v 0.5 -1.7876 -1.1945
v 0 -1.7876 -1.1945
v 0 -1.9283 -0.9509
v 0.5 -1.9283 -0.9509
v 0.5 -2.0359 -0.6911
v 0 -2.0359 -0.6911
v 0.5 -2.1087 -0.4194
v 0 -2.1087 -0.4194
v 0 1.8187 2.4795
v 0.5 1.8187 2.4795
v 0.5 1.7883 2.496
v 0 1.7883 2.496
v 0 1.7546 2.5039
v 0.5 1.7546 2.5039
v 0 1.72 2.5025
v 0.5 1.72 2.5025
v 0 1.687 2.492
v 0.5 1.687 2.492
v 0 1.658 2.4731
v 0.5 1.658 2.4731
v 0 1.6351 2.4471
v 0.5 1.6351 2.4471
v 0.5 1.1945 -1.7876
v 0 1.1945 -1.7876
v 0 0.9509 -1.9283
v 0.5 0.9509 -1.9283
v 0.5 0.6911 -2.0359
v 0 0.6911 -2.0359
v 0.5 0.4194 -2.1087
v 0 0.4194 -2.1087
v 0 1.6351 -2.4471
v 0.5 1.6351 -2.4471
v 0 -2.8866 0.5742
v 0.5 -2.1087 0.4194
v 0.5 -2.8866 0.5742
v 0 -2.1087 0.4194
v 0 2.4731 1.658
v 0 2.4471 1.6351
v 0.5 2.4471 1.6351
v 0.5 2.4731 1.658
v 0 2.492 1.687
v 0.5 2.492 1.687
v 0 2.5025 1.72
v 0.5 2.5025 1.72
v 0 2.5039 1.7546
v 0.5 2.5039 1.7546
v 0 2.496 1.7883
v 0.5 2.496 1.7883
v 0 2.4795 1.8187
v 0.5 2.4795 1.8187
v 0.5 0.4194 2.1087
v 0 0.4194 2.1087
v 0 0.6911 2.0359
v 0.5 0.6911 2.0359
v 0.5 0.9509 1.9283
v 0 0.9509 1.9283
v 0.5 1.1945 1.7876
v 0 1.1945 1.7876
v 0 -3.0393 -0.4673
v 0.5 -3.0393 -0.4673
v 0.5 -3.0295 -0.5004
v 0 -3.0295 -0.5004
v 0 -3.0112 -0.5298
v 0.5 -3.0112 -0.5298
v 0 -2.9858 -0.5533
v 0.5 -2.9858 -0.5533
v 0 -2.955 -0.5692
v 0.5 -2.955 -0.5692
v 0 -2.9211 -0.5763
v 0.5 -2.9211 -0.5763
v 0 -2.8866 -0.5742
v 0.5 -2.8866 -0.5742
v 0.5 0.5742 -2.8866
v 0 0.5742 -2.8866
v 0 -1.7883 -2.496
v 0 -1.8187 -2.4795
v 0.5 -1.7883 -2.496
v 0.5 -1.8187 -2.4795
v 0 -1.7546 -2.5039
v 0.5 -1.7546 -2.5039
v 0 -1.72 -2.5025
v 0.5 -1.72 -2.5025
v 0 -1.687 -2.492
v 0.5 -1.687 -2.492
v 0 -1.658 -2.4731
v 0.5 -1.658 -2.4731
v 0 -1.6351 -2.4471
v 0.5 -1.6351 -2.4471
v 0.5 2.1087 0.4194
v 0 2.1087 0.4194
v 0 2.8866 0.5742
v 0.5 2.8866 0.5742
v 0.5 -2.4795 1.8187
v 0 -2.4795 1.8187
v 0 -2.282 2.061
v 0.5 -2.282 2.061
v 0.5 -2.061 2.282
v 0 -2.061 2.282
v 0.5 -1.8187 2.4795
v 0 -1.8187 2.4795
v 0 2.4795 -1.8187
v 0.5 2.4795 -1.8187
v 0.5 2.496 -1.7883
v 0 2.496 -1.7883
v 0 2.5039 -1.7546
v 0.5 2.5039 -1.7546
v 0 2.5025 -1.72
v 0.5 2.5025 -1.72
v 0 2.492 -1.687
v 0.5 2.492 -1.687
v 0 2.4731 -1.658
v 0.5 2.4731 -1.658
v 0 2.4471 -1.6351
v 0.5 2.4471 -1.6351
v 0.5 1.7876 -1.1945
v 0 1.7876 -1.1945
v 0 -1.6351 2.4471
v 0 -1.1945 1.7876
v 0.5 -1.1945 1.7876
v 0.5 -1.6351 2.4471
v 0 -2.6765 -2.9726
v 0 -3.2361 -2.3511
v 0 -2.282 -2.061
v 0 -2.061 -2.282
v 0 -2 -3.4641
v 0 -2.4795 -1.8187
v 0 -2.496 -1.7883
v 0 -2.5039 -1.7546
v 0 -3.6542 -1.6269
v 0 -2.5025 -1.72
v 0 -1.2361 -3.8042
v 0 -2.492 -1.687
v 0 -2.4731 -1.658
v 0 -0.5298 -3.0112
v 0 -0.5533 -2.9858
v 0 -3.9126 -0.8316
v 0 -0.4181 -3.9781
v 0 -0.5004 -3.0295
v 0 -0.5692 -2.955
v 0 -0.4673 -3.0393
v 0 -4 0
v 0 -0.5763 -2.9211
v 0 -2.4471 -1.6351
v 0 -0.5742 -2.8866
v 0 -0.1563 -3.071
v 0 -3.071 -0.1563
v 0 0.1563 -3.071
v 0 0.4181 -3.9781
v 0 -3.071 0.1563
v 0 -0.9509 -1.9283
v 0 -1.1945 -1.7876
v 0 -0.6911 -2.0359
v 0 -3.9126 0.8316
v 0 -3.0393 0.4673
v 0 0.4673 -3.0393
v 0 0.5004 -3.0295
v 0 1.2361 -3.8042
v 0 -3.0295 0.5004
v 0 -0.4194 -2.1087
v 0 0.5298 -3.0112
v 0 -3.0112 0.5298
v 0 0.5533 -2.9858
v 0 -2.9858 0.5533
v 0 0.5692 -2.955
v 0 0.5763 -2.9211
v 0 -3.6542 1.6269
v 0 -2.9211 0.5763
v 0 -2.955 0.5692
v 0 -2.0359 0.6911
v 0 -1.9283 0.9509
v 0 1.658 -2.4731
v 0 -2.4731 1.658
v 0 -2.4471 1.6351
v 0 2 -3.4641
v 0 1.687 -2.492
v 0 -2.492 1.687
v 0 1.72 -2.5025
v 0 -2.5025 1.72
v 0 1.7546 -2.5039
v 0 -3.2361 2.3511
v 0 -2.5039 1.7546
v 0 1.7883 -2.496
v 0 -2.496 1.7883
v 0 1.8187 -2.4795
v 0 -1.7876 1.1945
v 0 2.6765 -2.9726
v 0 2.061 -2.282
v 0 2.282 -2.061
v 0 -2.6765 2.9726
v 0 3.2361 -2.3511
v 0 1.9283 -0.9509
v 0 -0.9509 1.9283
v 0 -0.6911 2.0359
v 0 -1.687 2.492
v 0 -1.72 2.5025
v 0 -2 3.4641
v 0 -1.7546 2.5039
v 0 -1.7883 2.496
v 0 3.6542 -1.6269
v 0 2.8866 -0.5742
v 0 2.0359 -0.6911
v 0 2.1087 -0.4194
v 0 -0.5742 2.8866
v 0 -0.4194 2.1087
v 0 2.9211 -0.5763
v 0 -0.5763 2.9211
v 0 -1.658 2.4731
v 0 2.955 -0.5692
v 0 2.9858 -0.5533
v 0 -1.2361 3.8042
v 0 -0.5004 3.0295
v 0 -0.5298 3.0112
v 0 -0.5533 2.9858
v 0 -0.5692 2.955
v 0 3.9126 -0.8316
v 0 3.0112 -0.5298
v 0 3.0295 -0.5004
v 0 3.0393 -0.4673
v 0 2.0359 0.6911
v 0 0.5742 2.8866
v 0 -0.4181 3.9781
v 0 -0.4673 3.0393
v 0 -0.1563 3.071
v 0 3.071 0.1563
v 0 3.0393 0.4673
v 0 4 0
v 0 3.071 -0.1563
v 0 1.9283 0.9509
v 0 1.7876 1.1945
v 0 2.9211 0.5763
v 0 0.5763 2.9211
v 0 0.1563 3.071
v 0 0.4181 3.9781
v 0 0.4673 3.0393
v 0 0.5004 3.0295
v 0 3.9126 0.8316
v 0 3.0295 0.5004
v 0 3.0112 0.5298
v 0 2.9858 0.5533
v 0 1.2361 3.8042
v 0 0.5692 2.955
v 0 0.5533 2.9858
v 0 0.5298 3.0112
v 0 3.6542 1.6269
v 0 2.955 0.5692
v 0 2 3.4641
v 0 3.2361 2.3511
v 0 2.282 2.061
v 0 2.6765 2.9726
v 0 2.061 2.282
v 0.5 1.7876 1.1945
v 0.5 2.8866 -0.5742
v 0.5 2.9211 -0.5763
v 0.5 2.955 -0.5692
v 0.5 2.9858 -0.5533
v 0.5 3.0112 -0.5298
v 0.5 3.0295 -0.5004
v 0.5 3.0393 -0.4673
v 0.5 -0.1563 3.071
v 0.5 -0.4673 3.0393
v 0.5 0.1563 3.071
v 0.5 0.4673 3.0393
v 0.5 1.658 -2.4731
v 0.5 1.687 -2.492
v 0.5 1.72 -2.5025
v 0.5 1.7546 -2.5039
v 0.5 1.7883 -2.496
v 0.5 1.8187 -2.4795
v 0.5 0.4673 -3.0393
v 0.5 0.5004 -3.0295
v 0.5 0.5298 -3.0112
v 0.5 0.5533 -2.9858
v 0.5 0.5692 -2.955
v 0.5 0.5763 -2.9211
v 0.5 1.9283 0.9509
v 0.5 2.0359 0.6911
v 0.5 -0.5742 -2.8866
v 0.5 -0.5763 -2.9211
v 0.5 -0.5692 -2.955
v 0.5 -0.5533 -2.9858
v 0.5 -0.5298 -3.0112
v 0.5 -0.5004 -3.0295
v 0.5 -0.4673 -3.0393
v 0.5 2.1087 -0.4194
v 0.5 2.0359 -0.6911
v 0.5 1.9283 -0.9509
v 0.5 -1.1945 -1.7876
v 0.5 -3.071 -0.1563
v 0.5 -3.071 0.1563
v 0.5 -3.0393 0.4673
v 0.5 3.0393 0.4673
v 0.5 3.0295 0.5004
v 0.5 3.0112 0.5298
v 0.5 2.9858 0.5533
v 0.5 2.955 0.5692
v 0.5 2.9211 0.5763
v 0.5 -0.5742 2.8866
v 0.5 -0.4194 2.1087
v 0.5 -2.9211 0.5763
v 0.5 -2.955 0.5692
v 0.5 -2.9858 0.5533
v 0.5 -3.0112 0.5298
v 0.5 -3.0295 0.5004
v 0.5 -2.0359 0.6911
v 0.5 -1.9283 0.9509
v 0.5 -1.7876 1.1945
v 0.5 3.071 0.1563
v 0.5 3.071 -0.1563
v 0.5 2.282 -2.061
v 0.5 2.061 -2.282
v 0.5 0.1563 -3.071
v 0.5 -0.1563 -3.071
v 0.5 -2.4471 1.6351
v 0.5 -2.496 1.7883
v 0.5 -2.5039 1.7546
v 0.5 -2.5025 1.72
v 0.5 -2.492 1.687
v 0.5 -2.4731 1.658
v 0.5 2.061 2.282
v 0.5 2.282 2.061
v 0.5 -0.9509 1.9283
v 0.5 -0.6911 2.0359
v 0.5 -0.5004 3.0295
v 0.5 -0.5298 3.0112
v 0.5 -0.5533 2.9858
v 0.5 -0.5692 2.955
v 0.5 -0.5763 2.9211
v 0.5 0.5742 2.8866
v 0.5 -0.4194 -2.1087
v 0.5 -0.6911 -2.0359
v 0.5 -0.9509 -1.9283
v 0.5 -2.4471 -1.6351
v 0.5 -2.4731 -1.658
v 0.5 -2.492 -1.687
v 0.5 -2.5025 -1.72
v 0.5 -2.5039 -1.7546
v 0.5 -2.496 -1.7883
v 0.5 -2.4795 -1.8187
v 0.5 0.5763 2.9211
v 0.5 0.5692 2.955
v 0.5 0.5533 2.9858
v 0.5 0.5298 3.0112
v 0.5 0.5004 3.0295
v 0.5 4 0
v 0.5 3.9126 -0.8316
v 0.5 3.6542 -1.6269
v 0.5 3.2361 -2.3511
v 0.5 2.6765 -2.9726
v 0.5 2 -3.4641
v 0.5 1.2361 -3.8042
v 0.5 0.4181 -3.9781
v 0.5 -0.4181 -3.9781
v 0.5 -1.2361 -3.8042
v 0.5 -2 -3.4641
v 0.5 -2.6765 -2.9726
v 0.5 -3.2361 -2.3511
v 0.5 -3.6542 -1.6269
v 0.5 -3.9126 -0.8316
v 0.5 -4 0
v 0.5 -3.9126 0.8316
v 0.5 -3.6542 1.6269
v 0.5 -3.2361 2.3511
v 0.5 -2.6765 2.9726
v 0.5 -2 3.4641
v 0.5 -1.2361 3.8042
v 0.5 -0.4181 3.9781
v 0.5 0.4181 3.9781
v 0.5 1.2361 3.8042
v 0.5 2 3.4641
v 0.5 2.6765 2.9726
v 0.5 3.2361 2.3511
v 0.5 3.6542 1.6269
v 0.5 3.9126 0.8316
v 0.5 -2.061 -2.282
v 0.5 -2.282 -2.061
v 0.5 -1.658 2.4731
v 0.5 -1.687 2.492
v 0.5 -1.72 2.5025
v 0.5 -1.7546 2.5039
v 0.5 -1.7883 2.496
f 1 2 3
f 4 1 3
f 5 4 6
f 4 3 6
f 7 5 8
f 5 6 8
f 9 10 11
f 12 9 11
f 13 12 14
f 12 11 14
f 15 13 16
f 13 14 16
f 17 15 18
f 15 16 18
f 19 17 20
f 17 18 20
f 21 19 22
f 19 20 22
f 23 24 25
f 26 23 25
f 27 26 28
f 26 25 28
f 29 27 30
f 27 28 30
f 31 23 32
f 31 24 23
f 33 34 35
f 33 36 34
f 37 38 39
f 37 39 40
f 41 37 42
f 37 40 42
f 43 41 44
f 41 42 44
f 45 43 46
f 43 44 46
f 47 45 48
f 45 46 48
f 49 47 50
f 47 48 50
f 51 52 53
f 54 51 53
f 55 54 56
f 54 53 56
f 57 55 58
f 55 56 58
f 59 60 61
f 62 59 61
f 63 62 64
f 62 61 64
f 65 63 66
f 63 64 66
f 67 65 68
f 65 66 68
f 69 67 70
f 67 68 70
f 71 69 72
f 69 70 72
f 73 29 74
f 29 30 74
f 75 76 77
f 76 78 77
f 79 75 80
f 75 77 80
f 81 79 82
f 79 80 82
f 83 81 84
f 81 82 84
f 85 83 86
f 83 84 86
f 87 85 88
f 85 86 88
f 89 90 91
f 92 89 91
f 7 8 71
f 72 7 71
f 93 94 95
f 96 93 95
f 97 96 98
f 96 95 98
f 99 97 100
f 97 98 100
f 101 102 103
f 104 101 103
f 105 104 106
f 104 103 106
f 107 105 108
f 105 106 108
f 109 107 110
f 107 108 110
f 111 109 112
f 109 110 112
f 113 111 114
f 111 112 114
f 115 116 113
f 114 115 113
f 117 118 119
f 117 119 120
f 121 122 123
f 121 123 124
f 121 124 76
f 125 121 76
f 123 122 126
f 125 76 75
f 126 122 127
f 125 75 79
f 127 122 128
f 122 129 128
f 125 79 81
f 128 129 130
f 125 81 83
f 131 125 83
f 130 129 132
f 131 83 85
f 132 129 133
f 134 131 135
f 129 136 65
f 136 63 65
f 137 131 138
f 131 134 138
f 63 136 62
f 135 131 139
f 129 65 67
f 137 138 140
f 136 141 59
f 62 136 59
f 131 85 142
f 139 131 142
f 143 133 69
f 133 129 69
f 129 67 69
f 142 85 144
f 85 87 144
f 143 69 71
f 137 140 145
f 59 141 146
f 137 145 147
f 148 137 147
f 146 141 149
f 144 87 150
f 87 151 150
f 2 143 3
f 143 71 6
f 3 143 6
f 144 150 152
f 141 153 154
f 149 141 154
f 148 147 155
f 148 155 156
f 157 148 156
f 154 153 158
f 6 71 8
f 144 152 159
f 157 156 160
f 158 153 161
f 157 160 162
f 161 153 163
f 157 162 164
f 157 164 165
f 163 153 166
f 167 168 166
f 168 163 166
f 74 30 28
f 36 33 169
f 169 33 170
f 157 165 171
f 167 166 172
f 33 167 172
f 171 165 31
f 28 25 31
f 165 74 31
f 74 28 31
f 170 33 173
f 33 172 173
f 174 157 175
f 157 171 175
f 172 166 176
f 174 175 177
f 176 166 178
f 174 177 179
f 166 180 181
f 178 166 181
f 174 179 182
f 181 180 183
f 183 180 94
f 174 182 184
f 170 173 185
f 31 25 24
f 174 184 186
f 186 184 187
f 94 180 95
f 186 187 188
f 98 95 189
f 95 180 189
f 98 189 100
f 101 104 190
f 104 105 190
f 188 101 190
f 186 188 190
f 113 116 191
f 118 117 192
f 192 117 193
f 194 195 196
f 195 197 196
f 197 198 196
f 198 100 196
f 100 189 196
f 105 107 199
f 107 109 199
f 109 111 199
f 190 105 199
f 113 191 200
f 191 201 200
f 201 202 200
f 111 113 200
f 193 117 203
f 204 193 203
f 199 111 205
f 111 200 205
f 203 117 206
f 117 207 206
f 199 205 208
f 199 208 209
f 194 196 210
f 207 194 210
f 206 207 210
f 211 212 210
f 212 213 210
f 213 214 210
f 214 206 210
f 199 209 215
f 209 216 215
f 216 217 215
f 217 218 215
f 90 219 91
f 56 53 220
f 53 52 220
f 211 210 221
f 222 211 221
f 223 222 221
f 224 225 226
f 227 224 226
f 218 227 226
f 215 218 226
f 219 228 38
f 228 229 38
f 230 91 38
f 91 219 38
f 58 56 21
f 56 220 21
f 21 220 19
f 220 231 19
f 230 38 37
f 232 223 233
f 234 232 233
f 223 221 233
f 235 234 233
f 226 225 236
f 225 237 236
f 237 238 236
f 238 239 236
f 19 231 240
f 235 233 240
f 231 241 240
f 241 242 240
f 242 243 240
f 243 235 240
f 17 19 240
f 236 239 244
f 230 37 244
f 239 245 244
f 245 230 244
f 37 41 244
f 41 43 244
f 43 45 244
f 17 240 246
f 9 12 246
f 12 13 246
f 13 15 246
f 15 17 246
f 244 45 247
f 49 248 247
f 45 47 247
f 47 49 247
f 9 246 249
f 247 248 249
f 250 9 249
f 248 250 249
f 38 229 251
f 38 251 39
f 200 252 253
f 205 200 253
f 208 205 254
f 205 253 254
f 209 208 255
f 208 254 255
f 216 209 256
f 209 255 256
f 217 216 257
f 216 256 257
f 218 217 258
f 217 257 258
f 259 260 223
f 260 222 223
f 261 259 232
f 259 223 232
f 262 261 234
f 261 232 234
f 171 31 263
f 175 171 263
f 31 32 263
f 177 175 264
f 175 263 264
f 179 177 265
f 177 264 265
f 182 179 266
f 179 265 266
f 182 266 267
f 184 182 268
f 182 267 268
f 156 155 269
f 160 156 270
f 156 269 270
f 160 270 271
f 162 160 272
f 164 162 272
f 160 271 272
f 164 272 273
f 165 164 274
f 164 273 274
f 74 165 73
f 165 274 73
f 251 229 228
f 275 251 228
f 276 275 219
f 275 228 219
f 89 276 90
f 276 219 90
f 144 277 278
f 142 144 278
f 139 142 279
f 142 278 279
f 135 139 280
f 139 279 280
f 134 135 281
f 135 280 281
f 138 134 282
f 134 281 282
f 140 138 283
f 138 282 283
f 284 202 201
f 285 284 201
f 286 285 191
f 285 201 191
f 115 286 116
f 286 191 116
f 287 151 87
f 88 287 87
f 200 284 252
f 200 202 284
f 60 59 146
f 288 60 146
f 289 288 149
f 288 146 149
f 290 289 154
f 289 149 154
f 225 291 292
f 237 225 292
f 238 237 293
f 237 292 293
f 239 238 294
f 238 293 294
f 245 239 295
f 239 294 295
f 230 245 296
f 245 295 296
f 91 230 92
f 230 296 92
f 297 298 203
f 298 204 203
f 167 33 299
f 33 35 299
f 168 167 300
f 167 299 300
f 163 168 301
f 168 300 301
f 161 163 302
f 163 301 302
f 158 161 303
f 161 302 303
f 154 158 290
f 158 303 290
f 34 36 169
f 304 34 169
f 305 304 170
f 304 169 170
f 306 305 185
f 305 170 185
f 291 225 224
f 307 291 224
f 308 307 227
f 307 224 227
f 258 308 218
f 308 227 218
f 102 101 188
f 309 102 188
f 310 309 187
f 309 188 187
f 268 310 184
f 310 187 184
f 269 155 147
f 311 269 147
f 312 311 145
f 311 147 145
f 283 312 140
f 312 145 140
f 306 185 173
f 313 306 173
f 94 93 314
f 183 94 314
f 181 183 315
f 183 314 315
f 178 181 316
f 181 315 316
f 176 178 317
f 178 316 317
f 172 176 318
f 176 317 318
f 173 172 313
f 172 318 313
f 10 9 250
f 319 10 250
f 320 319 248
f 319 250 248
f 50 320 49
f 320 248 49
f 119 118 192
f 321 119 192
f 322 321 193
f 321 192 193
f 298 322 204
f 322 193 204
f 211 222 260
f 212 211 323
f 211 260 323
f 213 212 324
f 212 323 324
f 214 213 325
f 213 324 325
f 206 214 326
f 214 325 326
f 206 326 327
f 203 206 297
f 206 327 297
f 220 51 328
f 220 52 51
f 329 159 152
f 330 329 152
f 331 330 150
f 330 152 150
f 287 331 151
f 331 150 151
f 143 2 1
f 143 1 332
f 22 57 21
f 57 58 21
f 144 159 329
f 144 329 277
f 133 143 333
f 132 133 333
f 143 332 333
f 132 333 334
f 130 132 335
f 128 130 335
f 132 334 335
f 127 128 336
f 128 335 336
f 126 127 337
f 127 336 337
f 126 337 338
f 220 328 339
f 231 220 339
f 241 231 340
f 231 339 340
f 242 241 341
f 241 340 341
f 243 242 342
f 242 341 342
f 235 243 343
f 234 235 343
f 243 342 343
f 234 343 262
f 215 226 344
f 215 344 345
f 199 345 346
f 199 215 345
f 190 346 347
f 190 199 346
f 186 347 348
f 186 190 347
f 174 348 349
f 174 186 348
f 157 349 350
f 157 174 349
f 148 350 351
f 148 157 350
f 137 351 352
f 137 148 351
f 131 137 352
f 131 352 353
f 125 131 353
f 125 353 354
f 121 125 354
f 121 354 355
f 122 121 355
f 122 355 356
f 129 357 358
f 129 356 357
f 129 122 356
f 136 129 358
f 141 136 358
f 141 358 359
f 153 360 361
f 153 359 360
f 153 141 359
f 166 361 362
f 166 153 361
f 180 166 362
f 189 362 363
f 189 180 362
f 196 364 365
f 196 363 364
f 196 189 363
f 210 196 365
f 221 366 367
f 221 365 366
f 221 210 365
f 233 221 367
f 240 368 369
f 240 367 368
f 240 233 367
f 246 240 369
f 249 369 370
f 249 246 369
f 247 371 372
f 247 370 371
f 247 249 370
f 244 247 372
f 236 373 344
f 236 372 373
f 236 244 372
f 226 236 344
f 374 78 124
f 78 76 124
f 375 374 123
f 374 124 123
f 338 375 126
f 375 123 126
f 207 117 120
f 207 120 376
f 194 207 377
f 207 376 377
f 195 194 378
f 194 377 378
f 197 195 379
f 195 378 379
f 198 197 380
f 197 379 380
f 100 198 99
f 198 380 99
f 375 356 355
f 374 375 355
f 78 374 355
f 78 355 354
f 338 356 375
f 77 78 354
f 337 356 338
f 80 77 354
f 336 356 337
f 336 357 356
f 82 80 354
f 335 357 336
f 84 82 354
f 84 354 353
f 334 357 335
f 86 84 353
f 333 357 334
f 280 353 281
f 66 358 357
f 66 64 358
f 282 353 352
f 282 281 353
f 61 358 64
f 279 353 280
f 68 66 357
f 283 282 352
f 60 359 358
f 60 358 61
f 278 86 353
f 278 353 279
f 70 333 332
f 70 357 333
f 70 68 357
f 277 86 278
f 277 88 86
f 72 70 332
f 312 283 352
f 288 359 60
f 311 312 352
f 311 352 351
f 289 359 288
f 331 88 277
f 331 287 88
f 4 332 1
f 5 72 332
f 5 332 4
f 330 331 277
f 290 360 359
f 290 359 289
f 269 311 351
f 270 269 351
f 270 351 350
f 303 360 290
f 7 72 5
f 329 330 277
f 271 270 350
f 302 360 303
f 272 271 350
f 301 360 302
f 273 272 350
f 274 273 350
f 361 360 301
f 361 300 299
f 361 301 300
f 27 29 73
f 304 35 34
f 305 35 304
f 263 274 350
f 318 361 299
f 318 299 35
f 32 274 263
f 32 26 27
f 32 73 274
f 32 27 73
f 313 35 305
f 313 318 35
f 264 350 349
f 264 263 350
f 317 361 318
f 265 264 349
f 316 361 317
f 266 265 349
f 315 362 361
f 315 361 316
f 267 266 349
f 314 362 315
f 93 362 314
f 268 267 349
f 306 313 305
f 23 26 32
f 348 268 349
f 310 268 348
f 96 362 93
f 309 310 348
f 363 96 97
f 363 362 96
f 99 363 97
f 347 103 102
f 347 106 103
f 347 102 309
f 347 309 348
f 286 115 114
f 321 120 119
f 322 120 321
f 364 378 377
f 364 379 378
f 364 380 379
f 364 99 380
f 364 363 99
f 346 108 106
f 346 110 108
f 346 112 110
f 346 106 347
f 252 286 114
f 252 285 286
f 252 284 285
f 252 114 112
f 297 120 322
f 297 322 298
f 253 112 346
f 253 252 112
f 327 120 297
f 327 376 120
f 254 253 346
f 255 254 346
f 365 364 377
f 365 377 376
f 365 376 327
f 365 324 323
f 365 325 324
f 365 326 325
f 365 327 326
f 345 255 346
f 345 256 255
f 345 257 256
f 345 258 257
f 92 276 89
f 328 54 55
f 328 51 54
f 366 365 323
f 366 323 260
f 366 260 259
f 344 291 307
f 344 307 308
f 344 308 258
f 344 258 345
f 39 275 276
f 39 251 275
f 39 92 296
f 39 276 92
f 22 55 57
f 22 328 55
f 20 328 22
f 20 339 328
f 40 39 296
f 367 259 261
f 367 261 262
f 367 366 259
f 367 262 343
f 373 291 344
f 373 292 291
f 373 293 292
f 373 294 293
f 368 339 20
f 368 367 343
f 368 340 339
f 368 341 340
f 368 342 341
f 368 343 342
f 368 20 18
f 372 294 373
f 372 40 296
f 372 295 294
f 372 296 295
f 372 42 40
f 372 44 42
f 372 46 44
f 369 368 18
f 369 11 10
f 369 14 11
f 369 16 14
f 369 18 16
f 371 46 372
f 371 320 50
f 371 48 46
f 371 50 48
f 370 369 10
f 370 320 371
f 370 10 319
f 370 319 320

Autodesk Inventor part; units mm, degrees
ref_plane "YZ Plane" through (0, 0, 0) normal (1, 0, 0) x (0, 1, 0)
ref_plane "XZ Plane" through (0, 0, 0) normal (0, 1, 0) x (-1, 0, 0)
sketch "Sketch1" plane through (0, 0, 0) normal (1, 0, 0) x (0, 1, 0)
  circle A0 centre (0, 0) radius 4
  circle A1 centre (0, 0) radius 2.15
  dimension "d0" = 8
  dimension "d1" = 4.3
extrude "Body" add sketch "Sketch1" along normal blind 0.5
sketch "Sketch2" plane through (0, 0, 0) normal (-1, 0, 0) x (0, 0, 1)
  circle A0 centre (0, 0) radius 2.15 projected
  circle A1 centre (0, 0) radius 4 projected
  arc A2 (0.5999, 3.0159) -> (-0.5999, 3.0159) centre (0, 0) ccw
  line L0 (-0.4194, 2.1087) -> (-0.5999, 3.0159)
  line L1 (0, 0) -> (0, 3.075) construction
  line L2 (0.4194, 2.1087) -> (0.5999, 3.0159)
  line L3 (-0.4194, 2.1087) -> (0, 0) construction
  line L4 (0.4194, 2.1087) -> (0, 0) construction
  dimension "d4" = 6.15
  dimension "d5" = 11.25
extrude "Cut" cut sketch "Sketch2" against normal blind 0.5 contours A0 L0 A2 L2
fillet "Fillet1" radius 0.129 2 edges at (0.25, 3.0159, 0.5999) (0.25, 3.0159, -0.5999)
pattern_circular "Cuts" count 8 over 360 about axis through (-10, 0, 0) along (1, 0, 0) of "Cut", "Fillet1"
ref_plane "Work Plane1" through (0, 0, 0) normal (0, 1, 0) x (1, 0, 0)
equation "\"d0\" = SD2"
equation "\"d1\" = SD1"
equation "\"d2\" = SD"
equation "\"d4\" = 0.5 * SD2 + 0.5 * SD1"
equation "\"d6\" = SD"
equation "\"d8\" = 0.03 * SD1"
equation "\"SD1\" = 4.3"
equation "\"SD2\" = 8"
equation "\"SD\" = 0.5"
equation "\"NND\" = 4"
properties part number "DIN 6797 - J 4.3" material "Steel, Mild"
